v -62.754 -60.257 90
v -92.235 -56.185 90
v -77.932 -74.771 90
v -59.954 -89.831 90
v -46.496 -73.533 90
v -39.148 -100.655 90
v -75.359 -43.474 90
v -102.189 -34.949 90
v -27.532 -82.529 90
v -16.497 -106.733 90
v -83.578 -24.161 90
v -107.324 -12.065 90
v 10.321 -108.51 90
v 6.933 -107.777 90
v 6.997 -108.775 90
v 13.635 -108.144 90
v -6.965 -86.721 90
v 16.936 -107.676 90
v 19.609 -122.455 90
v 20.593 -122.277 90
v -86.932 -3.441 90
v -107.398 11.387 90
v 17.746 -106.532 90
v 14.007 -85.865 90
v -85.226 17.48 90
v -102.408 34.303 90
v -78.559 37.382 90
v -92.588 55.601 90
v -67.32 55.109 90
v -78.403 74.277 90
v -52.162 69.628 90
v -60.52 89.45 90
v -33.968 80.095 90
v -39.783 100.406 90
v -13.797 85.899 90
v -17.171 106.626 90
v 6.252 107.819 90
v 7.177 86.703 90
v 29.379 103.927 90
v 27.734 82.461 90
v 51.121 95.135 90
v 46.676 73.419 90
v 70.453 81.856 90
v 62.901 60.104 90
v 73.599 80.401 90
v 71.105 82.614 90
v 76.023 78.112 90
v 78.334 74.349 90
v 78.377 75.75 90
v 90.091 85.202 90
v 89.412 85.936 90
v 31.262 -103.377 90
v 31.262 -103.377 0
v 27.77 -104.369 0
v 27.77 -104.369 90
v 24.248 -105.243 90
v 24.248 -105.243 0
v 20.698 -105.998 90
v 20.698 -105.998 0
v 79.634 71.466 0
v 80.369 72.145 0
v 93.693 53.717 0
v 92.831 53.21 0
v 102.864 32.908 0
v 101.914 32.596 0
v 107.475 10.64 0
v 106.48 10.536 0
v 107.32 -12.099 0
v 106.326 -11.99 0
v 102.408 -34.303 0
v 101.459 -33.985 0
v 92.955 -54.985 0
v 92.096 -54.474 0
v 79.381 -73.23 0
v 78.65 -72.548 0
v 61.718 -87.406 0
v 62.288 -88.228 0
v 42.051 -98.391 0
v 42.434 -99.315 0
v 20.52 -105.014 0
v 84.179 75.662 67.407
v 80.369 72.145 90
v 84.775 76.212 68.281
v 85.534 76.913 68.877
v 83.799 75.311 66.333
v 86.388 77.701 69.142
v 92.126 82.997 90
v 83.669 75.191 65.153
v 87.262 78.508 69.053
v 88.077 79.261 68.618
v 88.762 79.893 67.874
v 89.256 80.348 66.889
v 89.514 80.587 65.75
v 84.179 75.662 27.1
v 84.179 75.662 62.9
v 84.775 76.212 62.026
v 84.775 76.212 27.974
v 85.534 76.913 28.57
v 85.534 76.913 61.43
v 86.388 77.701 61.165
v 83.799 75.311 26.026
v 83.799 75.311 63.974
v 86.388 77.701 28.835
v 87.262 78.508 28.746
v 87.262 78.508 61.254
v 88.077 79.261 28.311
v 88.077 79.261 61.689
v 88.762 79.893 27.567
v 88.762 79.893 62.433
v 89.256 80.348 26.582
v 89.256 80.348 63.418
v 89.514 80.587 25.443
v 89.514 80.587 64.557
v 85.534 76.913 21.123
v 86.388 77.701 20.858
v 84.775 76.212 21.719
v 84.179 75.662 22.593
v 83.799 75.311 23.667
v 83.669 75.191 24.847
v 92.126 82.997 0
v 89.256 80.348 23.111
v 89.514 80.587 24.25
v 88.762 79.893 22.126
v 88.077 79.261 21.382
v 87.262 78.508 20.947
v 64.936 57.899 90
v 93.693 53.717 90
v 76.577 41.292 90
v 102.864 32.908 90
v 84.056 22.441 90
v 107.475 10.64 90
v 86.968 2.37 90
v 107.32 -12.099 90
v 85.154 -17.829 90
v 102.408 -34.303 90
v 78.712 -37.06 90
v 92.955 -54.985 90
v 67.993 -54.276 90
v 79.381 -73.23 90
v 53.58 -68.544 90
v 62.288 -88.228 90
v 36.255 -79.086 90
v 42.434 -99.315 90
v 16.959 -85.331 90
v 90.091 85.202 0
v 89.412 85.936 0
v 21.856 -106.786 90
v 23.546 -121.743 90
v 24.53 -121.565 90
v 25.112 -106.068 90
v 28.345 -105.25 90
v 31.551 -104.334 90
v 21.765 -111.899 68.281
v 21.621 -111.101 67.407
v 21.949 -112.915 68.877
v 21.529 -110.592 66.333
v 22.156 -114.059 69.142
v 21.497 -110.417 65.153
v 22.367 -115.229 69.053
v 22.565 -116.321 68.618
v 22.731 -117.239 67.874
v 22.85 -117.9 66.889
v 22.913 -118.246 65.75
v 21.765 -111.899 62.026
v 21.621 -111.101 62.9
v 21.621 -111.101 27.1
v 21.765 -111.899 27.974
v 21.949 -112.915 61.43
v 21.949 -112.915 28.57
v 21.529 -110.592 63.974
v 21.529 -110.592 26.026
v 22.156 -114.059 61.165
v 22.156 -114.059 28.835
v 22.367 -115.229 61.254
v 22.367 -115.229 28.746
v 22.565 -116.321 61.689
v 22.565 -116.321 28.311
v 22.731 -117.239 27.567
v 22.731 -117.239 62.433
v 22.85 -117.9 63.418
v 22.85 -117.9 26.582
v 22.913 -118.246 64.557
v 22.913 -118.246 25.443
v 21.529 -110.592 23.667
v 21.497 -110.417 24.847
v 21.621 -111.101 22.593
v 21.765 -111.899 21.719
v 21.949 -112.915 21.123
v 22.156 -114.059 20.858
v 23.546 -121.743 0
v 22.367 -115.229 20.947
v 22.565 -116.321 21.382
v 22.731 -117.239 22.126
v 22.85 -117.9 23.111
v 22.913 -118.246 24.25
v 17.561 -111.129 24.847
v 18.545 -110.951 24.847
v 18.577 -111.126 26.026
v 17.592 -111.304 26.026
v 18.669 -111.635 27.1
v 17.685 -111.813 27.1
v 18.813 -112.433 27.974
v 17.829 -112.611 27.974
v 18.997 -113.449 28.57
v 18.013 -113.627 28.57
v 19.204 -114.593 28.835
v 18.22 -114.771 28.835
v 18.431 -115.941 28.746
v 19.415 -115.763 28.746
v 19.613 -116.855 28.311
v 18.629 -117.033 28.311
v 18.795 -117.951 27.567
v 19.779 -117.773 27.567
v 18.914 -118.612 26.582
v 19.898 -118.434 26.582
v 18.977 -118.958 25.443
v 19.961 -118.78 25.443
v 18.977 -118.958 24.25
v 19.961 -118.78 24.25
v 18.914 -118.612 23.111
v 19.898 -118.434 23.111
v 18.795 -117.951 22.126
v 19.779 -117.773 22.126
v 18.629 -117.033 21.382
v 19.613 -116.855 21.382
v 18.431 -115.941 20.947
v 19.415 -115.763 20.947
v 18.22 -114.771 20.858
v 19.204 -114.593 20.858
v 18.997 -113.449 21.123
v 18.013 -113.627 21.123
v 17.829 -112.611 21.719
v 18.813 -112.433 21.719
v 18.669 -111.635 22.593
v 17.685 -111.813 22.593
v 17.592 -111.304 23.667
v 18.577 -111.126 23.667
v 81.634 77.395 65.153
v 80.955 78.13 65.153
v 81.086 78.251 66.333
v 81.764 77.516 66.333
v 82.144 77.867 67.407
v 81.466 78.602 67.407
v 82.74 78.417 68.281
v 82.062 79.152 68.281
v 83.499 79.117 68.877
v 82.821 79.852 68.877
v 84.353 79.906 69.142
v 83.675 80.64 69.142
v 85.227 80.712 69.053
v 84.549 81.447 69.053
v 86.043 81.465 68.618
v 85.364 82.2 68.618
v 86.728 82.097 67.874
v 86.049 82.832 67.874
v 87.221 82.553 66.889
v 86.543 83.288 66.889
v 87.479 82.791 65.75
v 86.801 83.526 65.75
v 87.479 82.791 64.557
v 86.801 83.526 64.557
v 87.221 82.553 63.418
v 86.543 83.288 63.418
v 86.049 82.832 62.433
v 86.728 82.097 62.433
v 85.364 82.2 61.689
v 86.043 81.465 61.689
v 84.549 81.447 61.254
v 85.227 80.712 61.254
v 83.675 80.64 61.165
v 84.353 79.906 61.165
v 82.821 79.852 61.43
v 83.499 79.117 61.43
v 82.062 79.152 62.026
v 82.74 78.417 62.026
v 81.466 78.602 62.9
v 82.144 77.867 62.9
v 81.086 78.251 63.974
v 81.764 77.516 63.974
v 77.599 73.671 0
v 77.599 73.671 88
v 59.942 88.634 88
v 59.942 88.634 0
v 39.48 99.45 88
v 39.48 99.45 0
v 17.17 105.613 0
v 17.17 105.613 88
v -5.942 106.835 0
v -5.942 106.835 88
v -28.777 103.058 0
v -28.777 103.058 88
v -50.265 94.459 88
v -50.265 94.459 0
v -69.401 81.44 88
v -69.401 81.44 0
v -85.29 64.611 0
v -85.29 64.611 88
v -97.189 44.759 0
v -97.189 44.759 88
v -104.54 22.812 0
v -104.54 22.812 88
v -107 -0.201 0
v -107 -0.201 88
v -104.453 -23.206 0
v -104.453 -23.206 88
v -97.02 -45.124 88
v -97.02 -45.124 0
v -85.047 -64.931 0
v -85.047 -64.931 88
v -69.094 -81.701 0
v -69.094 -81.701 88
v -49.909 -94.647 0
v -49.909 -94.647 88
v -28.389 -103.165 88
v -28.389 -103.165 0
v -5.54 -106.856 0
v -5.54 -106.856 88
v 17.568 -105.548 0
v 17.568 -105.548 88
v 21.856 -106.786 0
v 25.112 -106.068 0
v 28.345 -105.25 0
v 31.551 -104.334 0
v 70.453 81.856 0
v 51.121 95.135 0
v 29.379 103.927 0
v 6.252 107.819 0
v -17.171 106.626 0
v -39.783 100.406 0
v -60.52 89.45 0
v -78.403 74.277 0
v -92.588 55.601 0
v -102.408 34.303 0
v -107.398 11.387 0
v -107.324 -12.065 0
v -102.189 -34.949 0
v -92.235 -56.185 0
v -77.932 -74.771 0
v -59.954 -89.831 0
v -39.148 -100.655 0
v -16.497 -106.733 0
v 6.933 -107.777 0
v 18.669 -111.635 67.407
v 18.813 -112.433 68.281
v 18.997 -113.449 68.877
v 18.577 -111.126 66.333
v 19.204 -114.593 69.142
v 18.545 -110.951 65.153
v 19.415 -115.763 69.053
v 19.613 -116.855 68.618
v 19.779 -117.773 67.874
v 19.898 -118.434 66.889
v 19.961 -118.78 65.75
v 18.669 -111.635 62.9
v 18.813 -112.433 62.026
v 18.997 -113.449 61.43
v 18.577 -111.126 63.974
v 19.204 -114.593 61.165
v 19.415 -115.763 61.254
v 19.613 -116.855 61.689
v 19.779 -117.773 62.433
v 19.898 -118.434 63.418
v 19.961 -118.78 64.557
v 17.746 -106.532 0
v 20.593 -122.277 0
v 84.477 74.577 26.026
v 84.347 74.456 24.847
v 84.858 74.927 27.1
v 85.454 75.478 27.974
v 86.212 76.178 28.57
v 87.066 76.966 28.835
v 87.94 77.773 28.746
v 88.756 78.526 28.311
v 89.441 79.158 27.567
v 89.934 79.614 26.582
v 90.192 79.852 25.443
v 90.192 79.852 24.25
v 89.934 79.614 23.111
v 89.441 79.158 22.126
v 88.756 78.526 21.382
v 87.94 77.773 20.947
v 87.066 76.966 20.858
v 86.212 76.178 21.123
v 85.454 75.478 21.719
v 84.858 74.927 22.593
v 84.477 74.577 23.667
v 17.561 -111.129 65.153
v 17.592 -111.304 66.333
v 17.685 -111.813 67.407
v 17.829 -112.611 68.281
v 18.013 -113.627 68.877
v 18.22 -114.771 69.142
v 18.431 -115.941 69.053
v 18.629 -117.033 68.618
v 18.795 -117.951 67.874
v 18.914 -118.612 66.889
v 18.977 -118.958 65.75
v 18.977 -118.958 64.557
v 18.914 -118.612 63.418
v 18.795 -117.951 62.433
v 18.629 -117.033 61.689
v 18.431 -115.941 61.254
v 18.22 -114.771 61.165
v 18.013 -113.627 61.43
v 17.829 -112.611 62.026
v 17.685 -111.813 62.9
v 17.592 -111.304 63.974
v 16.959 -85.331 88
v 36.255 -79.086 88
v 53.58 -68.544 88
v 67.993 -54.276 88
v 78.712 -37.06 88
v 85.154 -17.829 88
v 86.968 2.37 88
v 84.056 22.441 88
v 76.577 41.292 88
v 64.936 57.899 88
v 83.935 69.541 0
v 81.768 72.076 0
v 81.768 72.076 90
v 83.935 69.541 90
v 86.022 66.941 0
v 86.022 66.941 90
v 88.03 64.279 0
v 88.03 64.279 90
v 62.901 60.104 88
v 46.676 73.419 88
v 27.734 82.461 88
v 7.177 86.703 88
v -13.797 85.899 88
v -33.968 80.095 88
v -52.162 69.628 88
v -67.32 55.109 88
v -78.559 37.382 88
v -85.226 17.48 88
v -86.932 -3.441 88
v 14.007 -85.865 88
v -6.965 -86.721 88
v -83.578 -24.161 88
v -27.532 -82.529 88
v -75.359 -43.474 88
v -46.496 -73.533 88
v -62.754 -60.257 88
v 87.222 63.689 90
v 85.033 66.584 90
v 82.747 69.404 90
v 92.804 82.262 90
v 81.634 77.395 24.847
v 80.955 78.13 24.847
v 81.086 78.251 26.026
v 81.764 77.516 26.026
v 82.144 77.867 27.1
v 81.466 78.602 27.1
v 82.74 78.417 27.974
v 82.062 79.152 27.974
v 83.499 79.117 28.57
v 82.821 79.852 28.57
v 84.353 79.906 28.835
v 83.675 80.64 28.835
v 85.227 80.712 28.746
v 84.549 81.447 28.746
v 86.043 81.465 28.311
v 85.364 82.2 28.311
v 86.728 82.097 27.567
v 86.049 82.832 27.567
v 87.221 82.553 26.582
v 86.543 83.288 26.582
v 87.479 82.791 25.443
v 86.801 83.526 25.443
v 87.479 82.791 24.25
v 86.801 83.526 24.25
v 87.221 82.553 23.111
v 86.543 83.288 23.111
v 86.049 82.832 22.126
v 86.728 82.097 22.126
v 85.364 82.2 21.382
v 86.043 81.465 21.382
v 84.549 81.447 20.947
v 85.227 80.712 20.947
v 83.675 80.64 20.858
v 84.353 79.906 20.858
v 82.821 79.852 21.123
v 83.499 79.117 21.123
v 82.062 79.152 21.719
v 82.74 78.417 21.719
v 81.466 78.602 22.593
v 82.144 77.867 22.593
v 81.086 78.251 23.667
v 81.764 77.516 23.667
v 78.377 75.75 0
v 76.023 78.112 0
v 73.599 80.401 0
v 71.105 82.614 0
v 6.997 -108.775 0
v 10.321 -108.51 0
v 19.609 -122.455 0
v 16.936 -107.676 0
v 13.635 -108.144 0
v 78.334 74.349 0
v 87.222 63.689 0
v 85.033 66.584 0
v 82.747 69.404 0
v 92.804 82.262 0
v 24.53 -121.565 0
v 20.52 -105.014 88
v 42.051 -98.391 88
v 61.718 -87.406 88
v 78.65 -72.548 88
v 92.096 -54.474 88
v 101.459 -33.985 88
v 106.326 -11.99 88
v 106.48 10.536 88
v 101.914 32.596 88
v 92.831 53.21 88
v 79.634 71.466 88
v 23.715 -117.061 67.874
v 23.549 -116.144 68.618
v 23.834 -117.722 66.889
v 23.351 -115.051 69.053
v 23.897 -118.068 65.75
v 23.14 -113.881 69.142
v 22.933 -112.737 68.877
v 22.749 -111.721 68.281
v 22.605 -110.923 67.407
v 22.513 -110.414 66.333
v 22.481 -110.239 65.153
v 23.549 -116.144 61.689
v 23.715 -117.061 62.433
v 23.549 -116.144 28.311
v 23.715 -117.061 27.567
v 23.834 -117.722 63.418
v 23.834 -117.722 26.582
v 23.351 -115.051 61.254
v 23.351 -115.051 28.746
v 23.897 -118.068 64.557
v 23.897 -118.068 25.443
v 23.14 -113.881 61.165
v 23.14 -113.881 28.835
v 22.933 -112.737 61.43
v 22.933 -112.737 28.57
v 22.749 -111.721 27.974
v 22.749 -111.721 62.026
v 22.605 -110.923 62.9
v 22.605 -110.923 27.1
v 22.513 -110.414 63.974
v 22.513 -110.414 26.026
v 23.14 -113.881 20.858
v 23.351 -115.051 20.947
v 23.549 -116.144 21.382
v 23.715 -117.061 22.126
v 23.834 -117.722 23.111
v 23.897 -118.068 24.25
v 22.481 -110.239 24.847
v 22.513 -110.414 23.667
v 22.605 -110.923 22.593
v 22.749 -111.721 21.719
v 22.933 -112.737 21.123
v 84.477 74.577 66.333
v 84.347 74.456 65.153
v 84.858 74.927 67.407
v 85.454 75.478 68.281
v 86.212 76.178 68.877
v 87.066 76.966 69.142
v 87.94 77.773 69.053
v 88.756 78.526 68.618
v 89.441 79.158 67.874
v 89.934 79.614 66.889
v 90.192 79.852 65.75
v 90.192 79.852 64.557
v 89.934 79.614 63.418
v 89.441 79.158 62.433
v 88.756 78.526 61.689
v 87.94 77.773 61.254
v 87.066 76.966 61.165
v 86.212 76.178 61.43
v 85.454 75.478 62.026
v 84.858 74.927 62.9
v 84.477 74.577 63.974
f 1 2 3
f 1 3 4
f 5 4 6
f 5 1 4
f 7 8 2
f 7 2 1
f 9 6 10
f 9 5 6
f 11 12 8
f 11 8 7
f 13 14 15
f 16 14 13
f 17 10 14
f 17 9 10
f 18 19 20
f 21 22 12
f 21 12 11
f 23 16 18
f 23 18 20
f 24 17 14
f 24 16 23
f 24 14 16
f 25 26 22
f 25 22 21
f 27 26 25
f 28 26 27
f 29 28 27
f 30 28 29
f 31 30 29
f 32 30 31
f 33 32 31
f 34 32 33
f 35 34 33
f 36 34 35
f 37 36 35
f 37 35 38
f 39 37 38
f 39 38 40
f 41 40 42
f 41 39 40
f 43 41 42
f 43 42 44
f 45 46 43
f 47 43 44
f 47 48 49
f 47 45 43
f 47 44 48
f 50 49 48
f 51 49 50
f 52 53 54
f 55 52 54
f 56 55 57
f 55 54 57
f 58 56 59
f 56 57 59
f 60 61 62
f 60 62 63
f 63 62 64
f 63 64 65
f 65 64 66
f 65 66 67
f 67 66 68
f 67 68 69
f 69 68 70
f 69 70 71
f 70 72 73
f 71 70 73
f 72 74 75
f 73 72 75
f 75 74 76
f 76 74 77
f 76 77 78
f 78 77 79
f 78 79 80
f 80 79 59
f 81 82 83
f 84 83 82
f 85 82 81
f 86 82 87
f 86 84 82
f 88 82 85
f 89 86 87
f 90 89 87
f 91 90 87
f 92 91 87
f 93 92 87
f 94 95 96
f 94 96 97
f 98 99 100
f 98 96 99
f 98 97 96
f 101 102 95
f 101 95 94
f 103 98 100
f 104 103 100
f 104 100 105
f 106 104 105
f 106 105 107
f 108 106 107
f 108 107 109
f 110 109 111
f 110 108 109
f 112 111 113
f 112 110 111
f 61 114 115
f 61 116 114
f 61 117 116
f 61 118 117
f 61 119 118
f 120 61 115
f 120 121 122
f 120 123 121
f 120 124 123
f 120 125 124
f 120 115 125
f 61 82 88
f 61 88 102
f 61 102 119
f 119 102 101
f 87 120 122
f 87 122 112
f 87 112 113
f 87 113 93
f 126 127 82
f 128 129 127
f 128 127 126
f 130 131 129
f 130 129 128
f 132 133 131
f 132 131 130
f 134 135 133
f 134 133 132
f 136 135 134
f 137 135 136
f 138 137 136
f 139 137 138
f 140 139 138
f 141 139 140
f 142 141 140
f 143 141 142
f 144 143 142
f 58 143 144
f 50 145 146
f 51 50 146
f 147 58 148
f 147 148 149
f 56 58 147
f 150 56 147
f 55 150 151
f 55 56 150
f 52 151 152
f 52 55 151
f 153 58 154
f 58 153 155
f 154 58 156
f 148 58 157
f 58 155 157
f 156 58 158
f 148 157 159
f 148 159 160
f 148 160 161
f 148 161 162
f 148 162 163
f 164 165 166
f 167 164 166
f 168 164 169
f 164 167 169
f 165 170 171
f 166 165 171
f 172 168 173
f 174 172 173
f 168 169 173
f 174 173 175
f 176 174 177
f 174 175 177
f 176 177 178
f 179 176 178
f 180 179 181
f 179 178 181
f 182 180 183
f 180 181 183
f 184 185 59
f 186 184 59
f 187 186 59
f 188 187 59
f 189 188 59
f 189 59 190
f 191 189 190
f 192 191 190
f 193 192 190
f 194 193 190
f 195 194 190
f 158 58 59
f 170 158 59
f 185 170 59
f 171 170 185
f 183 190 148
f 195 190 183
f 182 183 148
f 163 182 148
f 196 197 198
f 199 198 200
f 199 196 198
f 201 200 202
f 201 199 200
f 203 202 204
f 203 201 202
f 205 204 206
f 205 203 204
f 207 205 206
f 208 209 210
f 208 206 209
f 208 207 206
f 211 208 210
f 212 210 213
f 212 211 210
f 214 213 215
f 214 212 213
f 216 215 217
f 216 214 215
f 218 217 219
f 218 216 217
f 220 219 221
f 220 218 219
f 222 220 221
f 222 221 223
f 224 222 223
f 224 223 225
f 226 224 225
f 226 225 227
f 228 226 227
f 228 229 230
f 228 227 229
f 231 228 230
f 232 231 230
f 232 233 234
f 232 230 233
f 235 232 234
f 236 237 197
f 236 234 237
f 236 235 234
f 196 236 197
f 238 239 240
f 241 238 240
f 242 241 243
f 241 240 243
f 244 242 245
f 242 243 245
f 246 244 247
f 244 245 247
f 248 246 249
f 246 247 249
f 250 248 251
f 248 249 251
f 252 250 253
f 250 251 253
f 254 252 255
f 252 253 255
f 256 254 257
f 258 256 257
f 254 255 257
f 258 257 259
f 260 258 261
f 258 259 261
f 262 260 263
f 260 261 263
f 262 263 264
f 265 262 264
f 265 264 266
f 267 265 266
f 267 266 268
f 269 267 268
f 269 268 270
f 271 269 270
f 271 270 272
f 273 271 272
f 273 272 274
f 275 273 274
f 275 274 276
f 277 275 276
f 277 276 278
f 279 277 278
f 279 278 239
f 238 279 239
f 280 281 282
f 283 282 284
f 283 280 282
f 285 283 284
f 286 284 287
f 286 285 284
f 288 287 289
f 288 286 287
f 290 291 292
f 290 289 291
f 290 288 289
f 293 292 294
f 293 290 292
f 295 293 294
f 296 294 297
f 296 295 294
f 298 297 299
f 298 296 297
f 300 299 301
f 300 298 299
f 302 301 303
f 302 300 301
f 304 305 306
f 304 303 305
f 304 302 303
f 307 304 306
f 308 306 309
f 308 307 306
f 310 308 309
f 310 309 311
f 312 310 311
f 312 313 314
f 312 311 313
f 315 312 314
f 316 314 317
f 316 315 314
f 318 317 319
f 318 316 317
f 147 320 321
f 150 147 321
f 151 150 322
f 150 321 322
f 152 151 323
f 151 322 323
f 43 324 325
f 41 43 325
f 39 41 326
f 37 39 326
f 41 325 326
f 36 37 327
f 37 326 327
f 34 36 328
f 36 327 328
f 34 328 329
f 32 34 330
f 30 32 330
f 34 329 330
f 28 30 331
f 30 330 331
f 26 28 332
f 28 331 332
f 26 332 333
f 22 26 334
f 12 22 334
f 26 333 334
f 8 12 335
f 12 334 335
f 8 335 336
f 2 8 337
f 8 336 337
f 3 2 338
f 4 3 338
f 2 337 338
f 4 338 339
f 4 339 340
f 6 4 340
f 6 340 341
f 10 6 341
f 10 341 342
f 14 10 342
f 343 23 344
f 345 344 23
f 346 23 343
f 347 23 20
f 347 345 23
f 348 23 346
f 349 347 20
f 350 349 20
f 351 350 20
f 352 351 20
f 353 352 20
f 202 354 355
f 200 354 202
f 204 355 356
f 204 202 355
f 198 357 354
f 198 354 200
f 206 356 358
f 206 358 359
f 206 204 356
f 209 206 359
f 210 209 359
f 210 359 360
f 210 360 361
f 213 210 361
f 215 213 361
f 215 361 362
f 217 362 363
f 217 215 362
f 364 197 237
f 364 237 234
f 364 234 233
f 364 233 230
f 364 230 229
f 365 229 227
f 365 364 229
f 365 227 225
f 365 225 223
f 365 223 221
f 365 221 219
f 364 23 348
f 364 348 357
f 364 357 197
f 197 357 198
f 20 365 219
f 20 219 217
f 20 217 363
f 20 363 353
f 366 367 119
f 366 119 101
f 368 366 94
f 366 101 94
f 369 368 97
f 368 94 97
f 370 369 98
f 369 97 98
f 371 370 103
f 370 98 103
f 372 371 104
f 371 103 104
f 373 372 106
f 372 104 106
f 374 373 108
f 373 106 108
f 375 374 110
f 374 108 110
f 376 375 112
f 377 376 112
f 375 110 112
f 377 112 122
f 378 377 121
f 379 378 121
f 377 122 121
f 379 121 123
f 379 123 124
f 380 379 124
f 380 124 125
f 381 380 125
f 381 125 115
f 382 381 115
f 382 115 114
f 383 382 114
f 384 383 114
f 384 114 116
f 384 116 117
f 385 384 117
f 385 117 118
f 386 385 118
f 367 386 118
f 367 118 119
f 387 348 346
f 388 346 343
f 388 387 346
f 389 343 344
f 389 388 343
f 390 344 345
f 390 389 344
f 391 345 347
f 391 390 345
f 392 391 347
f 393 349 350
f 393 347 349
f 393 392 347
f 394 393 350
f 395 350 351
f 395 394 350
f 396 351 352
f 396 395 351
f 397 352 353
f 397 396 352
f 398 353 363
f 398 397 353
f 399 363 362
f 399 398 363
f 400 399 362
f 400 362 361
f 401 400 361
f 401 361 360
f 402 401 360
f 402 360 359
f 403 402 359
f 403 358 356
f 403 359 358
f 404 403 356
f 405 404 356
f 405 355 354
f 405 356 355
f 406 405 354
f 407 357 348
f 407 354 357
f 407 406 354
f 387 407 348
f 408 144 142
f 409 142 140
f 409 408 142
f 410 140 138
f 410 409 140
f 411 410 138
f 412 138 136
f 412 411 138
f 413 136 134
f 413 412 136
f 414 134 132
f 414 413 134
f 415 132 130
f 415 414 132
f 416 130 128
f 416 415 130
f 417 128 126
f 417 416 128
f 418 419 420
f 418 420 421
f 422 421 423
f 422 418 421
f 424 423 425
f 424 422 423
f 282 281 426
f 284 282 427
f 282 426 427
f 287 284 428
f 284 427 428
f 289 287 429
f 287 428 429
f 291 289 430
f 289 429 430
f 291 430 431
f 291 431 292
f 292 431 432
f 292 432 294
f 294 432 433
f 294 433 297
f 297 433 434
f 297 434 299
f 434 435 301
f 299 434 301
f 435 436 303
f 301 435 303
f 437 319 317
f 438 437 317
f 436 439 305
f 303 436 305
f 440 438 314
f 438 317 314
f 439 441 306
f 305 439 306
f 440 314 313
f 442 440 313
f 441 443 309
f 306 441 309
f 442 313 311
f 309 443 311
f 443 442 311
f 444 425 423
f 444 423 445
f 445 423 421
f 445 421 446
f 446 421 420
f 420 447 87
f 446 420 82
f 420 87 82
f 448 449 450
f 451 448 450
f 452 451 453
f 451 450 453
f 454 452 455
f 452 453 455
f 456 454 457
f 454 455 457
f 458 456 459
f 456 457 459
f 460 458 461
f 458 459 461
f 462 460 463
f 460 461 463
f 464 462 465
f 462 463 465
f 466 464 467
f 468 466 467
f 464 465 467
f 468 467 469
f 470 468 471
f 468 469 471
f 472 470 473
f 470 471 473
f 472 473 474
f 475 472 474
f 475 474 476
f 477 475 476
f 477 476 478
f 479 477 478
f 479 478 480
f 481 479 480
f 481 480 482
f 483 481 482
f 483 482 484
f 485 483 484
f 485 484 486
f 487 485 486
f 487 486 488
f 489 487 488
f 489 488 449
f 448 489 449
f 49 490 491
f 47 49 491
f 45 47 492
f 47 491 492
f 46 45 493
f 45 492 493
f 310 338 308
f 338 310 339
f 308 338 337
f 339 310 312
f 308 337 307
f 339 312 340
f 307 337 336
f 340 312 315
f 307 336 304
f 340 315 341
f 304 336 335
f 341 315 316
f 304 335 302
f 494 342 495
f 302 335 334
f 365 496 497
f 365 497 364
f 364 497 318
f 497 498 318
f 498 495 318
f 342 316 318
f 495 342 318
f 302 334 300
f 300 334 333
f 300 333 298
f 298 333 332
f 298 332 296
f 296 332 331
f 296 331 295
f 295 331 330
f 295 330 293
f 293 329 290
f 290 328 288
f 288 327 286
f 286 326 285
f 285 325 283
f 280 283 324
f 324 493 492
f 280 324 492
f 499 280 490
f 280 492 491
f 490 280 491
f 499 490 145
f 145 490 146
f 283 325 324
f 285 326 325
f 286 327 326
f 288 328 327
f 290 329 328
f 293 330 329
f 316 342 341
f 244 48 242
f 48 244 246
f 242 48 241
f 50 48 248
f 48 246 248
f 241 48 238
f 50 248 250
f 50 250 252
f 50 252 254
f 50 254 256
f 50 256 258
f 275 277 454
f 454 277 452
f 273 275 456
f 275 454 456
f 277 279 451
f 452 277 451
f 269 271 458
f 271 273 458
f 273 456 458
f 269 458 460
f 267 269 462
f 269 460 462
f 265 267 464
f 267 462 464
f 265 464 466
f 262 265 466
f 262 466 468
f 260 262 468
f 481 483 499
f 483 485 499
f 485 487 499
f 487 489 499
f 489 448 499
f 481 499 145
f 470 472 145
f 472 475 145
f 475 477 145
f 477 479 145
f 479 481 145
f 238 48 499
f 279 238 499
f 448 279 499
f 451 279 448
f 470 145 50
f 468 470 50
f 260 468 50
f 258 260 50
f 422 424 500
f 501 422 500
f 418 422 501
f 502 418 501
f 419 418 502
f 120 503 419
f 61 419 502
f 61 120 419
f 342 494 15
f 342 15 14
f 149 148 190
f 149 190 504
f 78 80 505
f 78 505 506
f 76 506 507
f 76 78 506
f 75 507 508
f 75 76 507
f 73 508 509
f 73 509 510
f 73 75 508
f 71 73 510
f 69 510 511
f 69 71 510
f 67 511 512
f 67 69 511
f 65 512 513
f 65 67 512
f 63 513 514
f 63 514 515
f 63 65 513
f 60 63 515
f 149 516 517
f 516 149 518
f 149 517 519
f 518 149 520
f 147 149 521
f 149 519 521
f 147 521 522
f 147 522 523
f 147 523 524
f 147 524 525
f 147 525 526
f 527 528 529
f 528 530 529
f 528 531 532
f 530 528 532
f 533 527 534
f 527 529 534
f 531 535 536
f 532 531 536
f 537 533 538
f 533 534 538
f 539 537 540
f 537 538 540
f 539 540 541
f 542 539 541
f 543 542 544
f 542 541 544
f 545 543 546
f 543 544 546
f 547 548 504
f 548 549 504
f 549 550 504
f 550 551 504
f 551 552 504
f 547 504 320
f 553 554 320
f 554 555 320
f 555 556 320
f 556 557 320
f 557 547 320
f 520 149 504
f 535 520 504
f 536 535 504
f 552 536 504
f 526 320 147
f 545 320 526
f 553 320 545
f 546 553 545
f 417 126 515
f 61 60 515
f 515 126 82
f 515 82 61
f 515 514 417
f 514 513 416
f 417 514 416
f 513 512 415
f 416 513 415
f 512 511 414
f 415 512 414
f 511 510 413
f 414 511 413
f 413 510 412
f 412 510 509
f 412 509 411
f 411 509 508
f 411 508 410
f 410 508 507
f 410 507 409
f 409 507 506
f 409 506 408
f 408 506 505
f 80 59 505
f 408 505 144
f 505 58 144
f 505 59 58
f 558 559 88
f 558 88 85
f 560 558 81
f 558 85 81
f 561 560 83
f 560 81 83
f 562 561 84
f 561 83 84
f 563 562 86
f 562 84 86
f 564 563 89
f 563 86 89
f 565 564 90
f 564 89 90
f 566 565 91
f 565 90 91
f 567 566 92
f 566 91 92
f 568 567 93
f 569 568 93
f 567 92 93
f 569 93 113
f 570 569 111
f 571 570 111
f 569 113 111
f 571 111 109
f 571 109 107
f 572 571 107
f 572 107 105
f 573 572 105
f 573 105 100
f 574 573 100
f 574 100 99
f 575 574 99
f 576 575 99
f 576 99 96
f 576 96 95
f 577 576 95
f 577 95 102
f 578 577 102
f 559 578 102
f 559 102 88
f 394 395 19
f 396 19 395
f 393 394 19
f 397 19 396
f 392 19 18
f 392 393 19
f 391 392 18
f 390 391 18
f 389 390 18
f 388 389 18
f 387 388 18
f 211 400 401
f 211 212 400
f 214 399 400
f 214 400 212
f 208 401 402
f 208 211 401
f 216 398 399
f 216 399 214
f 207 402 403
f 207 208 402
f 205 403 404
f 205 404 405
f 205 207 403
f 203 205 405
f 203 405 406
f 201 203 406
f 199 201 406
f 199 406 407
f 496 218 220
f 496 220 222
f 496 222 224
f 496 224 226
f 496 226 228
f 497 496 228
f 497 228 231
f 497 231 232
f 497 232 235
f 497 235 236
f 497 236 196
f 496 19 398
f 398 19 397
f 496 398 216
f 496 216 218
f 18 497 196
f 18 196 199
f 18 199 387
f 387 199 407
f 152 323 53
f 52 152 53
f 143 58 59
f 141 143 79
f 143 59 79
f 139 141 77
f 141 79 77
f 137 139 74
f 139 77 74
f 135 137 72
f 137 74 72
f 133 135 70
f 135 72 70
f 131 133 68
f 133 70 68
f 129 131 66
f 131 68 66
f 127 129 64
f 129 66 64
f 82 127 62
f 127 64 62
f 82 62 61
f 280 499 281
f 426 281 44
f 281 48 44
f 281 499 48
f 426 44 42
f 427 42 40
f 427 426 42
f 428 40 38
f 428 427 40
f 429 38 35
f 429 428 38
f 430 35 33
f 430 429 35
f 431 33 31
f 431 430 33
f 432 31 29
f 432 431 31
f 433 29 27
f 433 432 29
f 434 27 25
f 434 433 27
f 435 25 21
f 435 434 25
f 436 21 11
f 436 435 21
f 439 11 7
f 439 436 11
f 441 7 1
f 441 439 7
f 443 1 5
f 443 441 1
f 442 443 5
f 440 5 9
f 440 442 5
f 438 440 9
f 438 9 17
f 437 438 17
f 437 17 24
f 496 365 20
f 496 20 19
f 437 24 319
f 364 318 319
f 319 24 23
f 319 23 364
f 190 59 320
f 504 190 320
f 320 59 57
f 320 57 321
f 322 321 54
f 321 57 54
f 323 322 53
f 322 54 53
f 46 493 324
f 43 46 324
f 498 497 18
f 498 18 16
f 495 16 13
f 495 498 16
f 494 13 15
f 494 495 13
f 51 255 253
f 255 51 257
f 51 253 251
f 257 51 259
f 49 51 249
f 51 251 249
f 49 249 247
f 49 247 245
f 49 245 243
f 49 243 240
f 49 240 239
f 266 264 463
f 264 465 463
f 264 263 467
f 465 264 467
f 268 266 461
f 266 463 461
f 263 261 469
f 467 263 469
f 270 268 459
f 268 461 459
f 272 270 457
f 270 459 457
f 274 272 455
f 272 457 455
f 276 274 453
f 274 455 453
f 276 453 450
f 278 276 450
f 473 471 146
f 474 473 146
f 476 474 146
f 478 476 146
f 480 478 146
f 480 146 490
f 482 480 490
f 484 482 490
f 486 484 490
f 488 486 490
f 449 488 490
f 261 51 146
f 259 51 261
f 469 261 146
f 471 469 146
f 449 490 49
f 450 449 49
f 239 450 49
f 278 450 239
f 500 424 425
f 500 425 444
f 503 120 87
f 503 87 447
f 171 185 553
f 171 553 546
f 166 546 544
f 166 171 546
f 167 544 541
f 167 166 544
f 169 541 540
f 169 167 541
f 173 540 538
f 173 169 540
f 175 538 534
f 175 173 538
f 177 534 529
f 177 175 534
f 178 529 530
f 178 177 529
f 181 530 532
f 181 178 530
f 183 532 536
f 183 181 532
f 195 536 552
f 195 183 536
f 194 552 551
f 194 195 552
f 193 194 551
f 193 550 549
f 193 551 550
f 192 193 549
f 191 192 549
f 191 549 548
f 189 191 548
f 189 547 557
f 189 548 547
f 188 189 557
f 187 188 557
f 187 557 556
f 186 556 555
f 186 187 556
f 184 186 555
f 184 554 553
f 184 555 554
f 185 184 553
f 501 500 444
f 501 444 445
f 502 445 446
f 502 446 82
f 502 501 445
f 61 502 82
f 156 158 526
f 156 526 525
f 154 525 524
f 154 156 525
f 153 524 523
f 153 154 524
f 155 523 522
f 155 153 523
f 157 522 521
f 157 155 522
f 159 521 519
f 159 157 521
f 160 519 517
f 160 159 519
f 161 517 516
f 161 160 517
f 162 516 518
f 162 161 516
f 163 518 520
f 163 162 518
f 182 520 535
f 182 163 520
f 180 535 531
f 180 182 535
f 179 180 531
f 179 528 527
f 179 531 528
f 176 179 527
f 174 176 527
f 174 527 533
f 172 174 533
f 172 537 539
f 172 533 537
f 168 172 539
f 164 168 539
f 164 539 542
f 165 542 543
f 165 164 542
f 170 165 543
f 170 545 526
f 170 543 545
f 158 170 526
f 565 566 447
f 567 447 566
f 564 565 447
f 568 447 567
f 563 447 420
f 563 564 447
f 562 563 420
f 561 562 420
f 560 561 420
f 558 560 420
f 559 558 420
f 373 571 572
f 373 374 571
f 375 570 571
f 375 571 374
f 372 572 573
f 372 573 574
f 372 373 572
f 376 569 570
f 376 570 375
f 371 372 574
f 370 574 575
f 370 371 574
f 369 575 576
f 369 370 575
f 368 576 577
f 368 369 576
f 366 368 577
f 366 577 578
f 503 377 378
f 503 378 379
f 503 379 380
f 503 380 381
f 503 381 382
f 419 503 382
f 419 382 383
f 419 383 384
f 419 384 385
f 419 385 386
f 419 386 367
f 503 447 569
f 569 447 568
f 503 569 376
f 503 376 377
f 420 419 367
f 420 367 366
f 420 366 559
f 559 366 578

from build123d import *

# Parameters (mm, degrees)
SKETCH1_R           = 108
SKETCH1_R_2         = 107
BOSS_EXTRUDE1_DEPTH = 90
BOSS_EXTRUDE2_START = -2
SKETCH5_R           = 107
SKETCH5_R_2         = 87
BOSS_EXTRUDE2_DEPTH = 2
CUT_EXTRUDE1_DEPTH  = 178.279440432
BOSS_EXTRUDE3_DEPTH = 90
SKETCH7_R           = 4
CUT_EXTRUDE2_DEPTH  = 189.630747631


with BuildPart() as part:
    # Sketch1 → Boss-Extrude1 (new body)
    with BuildSketch(Plane.XY):
        with Locations(Location((0, 0, 0), (0, 0, 180))):
            Circle(SKETCH1_R)
        with Locations(Location((0, 0, 0), (0, 0, 180))):
            Circle(SKETCH1_R_2, mode=Mode.SUBTRACT)
    extrude(amount=BOSS_EXTRUDE1_DEPTH)

    # Sketch5 → Boss-Extrude2 (add)
    with BuildSketch(Plane.XY.offset(90).offset(BOSS_EXTRUDE2_START)):
        with Locations(Location((0, 0, 0), (0, 0, 180))):
            Circle(SKETCH5_R)
        Circle(SKETCH5_R_2, mode=Mode.SUBTRACT)
    extrude(amount=BOSS_EXTRUDE2_DEPTH)

    # Sketch3 → Cut-Extrude1 (cut, through all)
    with BuildSketch(Plane.XY.offset(90)):
        Polygon((78.341510836, 74.356288771), (62.901105553, 60.10366811), (64.935941148, 57.899253425), (80.376346432, 72.151874087), align=None)
        Polygon((14.00719823, -85.865001006), (17.747390761, -106.5423865), (20.699485047, -106.008402114), (16.959292516, -85.33101662), align=None)
    extrude(amount=-CUT_EXTRUDE1_DEPTH, mode=Mode.SUBTRACT)


with BuildPart() as cut_extrude1_piece_1:
    # of the separate pieces the step leaves, piece 1, a body of its own (cut_extrude1_pieces)
    add(part.part.solids().sort_by_distance((78.33385625, 74.349223029, 0))[0])

    # Sketch6 → Boss-Extrude3 (add, through all)
    with BuildSketch(Plane.XY):
        with BuildLine():
            Line((78.33385625, 74.349223029), (90.090734566, 85.201679537))
            Line((90.090734566, 85.201679537), (89.412456034, 85.936484432))
            Line((89.412456034, 85.936484432), (78.376967774, 75.749923581))
            ThreePointArc((78.376967774, 75.749923581), (74.819696806, 79.26545887), (71.104907327, 82.614115949))
            Line((71.104907327, 82.614115949), (70.452568728, 81.856188279))
            ThreePointArc((70.452568728, 81.856188279), (74.487842607, 78.202054345), (78.33385625, 74.349223029))
        make_face()
        with BuildLine():
            Line((80.368691845, 72.144808345), (92.125570161, 82.997264853))
            Line((92.125570161, 82.997264853), (92.803848693, 82.262459958))
            Line((92.803848693, 82.262459958), (81.768360433, 72.075899107))
            ThreePointArc((81.768360433, 72.075899107), (84.988520543, 68.2491859), (88.029753635, 64.278787131))
            Line((88.029753635, 64.278787131), (87.222141216, 63.689073487))
            ThreePointArc((87.222141216, 63.689073487), (83.902006499, 68.003333047), (80.368691845, 72.144808345))
        make_face()
        with BuildLine():
            Line((20.697630845, -105.998151292), (23.545547572, -121.742654153))
            Line((23.545547572, -121.742654153), (24.529579001, -121.564659357))
            Line((24.529579001, -121.564659357), (21.856407538, -106.786223126))
            ThreePointArc((21.856407538, -106.786223126), (26.731850905, -105.671226676), (31.55101549, -104.33375974))
            Line((31.55101549, -104.33375974), (31.261556633, -103.376569284))
            ThreePointArc((31.261556633, -103.376569284), (26.012640464, -104.820525357), (20.697630845, -105.998151292))
        make_face()
        with BuildLine():
            Line((19.609421857, -122.454633334), (16.936250395, -107.676197103))
            ThreePointArc((16.936250395, -107.676197103), (11.979147286, -108.33974354), (6.996824382, -108.775201441))
            Line((6.996824382, -108.775201441), (6.932633332, -107.777263813))
            ThreePointArc((6.932633332, -107.777263813), (12.354780586, -107.291003335), (17.745536559, -106.532135679))
            Line((17.745536559, -106.532135679), (20.593453286, -122.276638539))
            Line((20.593453286, -122.276638539), (19.609421857, -122.454633334))
        make_face()
    extrude(amount=BOSS_EXTRUDE3_DEPTH)


with BuildPart() as cut_extrude1_piece_2:
    # of the separate pieces the step leaves, piece 2, a body of its own (cut_extrude1_pieces)
    add(part.part.solids().sort_by_distance((20.697630845, -105.998151292, 0))[0])


with BuildPart() as boss_extrude3_piece_1:
    # of the separate pieces the step leaves, piece 1, a body of its own (boss_extrude3_pieces)
    add(cut_extrude1_piece_1.part.solids().sort_by_distance((70.452568728, 81.856188279, 0))[0])


with BuildPart() as boss_extrude3_piece_2:
    # of the separate pieces the step leaves, piece 2, a body of its own (boss_extrude3_pieces)
    add(cut_extrude1_piece_1.part.solids().sort_by_distance((20.697630845, -105.998151292, 0))[0])


with BuildPart() as boss_extrude3_piece_3:
    # of the separate pieces the step leaves, piece 3, a body of its own (boss_extrude3_pieces)
    add(cut_extrude1_piece_1.part.solids().sort_by_distance((87.222141216, 63.689073487, 0))[0])


with BuildPart() as cut_extrude2_tool:
    # Sketch7 → Cut-Extrude2 (new, through all)
    with BuildSketch(Plane(origin=(-1.695696329, 1.837012237, 0), x_dir=(0, 0, 1), z_dir=(-0.6782785317528589, 0.7348048947599533, 0))):
        with Locations(Location((24.846500871, 116.480454667, 0), (0, 0, 270))):
            Circle(SKETCH7_R)
        with Locations(Location((65.153499129, 116.480454667, 0), (0, 0, 270))):
            Circle(SKETCH7_R)
    cut_extrude2 = extrude(amount=-CUT_EXTRUDE2_DEPTH)


with BuildPart() as boss_extrude3_piece_1_1:
    add(boss_extrude3_piece_1.part)

    # Cut-Extrude2: cut by cut_extrude2_tool
    add(cut_extrude2_tool.part, mode=Mode.SUBTRACT)


with BuildPart() as boss_extrude3_piece_3_1:
    add(boss_extrude3_piece_3.part)

    # Cut-Extrude2: cut by cut_extrude2_tool
    add(cut_extrude2_tool.part, mode=Mode.SUBTRACT)


with BuildPart() as mirror4_tool:
    # Mirror4: Cut-Extrude2 across plane
    add(cut_extrude2.mirror(Plane(origin=(0, 0, 0), x_dir=(0, 0, 1), z_dir=(-0.31761703385268936, -0.9482190779596347, 0))))


with BuildPart() as boss_extrude3_piece_1_2:
    add(boss_extrude3_piece_1_1.part)

    # Mirror4: cut by mirror4_tool
    add(mirror4_tool.part, mode=Mode.SUBTRACT)


with BuildPart() as boss_extrude3_piece_2_1:
    add(boss_extrude3_piece_2.part)

    # Mirror4: cut by mirror4_tool
    add(mirror4_tool.part, mode=Mode.SUBTRACT)


solid = Compound([cut_extrude1_piece_2.part, boss_extrude3_piece_3_1.part, boss_extrude3_piece_1_2.part, boss_extrude3_piece_2_1.part])
